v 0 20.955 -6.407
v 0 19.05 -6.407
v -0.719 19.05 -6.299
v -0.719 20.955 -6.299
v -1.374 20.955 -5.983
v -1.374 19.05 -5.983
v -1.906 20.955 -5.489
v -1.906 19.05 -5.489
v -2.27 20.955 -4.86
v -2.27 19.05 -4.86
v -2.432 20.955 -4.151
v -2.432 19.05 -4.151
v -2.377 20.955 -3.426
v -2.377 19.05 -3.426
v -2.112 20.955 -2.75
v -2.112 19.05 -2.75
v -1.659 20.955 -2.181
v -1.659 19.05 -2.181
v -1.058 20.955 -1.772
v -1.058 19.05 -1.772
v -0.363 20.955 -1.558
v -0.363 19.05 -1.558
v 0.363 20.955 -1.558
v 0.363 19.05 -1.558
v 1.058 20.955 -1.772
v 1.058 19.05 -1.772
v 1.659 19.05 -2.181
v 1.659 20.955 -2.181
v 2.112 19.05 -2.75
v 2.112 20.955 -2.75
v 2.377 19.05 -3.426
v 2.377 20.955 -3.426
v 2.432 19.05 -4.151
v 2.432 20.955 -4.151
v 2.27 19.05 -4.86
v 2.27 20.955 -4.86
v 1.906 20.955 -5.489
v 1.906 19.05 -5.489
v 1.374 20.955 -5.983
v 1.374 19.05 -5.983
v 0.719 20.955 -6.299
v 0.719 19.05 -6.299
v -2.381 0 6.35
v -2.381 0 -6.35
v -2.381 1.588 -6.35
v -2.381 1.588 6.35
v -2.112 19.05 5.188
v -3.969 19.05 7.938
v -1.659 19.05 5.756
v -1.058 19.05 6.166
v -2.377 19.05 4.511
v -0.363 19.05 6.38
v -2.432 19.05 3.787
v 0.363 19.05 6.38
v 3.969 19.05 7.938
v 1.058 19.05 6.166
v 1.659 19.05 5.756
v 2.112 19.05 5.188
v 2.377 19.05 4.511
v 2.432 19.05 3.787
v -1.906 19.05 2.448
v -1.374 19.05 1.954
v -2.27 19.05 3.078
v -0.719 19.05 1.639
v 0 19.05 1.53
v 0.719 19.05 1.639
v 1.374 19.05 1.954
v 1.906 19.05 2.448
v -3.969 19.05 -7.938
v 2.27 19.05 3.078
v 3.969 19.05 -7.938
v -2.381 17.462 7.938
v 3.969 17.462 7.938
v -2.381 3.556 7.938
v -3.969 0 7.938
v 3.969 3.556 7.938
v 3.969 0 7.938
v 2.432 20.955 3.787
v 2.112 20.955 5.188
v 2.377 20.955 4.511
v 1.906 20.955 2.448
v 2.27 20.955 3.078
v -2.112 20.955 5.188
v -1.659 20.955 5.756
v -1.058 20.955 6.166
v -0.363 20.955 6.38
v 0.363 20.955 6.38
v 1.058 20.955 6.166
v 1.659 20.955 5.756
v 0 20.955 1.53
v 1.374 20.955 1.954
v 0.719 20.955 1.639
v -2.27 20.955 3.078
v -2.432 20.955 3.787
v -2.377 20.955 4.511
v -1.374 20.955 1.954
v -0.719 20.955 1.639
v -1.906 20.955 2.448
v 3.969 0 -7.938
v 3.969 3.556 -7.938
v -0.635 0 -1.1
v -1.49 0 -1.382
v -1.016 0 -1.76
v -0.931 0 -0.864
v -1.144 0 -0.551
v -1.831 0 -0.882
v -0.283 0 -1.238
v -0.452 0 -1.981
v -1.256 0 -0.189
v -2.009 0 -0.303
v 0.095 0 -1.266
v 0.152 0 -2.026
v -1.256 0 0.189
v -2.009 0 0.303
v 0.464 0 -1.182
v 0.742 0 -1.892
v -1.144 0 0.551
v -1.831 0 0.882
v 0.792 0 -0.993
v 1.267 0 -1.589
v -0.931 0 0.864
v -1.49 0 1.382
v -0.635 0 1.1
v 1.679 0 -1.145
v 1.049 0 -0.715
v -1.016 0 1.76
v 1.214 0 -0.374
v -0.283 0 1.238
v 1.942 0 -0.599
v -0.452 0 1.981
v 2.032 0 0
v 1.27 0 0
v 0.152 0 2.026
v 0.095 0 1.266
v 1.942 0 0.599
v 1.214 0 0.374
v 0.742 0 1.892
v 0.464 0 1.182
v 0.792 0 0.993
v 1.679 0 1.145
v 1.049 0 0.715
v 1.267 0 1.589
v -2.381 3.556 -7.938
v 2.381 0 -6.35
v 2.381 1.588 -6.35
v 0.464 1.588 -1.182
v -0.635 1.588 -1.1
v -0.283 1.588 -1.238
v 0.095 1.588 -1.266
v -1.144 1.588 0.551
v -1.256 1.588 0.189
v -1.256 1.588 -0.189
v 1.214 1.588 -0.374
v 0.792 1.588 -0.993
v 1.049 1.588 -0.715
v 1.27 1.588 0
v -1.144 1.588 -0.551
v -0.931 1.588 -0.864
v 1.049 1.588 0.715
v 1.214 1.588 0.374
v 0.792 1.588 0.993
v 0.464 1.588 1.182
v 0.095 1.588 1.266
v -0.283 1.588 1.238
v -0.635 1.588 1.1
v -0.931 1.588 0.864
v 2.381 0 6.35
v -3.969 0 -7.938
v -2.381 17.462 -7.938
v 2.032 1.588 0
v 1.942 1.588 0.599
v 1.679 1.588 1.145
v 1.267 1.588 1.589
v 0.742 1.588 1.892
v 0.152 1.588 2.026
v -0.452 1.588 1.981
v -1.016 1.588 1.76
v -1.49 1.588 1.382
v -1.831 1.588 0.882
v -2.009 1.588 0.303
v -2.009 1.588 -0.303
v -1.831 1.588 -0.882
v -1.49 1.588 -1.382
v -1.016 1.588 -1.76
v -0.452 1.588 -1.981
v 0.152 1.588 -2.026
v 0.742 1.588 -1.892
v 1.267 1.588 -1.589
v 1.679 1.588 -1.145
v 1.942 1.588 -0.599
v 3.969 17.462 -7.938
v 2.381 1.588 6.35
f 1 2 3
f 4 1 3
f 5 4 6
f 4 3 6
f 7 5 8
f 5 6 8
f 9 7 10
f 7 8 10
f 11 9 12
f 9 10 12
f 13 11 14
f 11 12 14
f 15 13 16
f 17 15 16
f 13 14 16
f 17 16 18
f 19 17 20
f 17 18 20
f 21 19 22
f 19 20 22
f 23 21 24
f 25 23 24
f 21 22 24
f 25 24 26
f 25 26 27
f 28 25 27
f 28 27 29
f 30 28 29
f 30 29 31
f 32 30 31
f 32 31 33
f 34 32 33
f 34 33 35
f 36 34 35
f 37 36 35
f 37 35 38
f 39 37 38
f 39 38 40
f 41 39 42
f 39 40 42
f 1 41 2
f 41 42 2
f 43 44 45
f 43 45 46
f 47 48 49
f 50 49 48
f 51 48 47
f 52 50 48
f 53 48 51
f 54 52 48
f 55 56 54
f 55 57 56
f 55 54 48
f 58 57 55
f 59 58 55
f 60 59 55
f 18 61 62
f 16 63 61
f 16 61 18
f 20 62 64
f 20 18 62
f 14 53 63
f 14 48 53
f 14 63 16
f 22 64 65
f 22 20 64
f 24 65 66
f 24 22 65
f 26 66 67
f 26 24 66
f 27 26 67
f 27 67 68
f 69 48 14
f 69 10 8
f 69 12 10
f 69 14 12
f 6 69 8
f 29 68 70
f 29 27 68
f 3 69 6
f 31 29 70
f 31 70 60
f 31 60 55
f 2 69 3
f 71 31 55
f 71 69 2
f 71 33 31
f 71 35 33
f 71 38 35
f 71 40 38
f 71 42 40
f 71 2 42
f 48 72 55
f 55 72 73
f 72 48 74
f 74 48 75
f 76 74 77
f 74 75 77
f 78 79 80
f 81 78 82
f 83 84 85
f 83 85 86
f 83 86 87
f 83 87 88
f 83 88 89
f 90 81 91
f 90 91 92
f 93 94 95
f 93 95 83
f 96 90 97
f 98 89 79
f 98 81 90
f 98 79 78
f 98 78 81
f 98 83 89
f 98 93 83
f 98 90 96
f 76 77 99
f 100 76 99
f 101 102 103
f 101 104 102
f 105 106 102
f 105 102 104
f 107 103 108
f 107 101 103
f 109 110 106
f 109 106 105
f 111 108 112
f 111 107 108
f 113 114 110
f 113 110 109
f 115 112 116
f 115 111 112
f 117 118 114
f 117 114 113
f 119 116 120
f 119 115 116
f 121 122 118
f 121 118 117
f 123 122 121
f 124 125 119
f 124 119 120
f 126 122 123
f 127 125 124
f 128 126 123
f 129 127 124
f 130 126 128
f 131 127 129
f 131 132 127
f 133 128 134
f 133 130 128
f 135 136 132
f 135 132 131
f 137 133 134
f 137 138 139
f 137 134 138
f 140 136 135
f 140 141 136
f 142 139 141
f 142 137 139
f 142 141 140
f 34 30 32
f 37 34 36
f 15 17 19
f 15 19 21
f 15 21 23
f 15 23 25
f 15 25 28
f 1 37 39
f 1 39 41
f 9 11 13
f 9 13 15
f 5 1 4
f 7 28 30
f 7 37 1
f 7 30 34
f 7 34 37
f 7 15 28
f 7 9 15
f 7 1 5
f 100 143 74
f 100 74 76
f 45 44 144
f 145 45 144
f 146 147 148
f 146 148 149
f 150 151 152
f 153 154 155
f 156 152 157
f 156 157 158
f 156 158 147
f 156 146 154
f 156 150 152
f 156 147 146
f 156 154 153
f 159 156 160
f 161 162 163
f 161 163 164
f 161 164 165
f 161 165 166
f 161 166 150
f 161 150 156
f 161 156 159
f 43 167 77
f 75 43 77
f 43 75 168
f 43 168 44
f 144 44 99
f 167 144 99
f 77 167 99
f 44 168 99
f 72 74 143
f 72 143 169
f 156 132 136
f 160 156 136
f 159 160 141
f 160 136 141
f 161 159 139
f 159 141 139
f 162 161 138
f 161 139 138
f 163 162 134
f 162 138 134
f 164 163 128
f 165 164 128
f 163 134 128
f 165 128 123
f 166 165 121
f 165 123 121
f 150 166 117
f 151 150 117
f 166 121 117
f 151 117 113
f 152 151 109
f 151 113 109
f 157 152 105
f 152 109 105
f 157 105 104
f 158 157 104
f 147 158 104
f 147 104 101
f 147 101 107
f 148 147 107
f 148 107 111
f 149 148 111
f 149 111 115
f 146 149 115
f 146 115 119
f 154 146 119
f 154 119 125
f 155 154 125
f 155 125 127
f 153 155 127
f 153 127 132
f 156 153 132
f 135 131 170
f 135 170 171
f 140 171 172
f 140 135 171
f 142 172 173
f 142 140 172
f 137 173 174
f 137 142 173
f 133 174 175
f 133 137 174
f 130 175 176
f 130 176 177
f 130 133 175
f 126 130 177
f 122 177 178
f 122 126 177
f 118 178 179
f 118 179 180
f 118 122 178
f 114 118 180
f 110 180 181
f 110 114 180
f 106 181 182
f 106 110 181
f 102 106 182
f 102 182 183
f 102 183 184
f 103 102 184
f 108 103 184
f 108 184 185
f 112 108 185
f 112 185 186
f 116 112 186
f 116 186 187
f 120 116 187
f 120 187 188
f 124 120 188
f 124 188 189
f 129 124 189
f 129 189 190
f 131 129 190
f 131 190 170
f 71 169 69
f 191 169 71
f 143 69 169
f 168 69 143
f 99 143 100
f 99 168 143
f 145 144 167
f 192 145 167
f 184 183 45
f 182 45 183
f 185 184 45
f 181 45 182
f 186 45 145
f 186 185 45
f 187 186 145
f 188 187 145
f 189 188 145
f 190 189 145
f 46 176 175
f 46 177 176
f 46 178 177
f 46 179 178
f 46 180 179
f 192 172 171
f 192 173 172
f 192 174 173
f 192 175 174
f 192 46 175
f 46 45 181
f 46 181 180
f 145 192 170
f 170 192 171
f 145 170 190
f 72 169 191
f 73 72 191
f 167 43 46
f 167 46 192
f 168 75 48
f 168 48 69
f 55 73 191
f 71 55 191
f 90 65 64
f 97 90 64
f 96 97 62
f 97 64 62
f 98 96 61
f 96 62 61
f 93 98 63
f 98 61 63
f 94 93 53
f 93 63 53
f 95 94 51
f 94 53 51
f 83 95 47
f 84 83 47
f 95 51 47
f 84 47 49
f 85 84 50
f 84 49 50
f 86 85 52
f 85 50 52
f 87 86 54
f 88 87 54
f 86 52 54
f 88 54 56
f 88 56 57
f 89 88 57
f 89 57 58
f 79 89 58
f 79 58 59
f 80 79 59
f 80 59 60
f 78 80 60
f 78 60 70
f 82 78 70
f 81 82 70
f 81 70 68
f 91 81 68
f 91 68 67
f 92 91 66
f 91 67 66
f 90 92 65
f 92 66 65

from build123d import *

# Parameters (mm, degrees)
SKETCH1_W           = 7.9375
SKETCH1_H           = 15.875
BASE_EXTRUDE_DEPTH  = 19.05
SKETCH2_R           = 2.4384
BOSS_EXTRUDE1_DEPTH = 1.905
LPATTERN6_COUNT     = 2
LPATTERN6_PITCH     = 7.9375
SKETCH4_W           = 4.7625
SKETCH4_H           = 12.7
CUT_EXTRUDE1_DEPTH  = 1.5875
INSDOT_REACH        = 24.757
SKETCH3_R           = 2.032
SKETCH3_R_2         = 1.27
SKETCH5_W           = 6.35
SKETCH5_H           = 13.9065
CUT_EXTRUDE2_DEPTH  = 27.587189144


with BuildPart() as part:
    # Sketch1 → Base-Extrude (new body)
    with BuildSketch(Plane(origin=(0, 0, 0), x_dir=(1, 0, 0), z_dir=(0, 1, 0))):
        Rectangle(SKETCH1_W, SKETCH1_H)
    extrude(amount=BASE_EXTRUDE_DEPTH)

    # Sketch2 → Boss-Extrude1 (add)
    with BuildSketch(Plane(origin=(0, 19.05, 0), x_dir=(-1, 0, 0), z_dir=(0, 1, 0))):
        with Locations(Location((0, 3.96875, 0), (0, 0, 270))):
            Circle(SKETCH2_R)
    boss_extrude1 = extrude(amount=BOSS_EXTRUDE1_DEPTH)

    # LPattern6: Boss-Extrude1 ×2
    with Locations(*[(0, 0, -i * LPATTERN6_PITCH) for i in range(1, LPATTERN6_COUNT)]):
        add(boss_extrude1)

    # Sketch4 → Cut-Extrude1 (cut)
    with BuildSketch(Plane.XZ):
        Rectangle(SKETCH4_W, SKETCH4_H)
    extrude(amount=-CUT_EXTRUDE1_DEPTH, mode=Mode.SUBTRACT)

    # Sketch3 → InsDot (add, up to next)
    with BuildSketch(Plane.XZ, mode=Mode.PRIVATE) as insdot_sk1:
        Circle(SKETCH3_R)
        Circle(SKETCH3_R_2, mode=Mode.SUBTRACT)
    insdot_tool1 = extrude(insdot_sk1.sketch, amount=-INSDOT_REACH, mode=Mode.PRIVATE) - part.part
    add(insdot_tool1.solids().sort_by_distance((-1.974526, 0, 0))[0])

    # Sketch5 → Cut-Extrude2 (cut, through all)
    with BuildSketch(Plane.XY.offset(7.9375)):
        with Locations((0.79375, 10.50925)):
            Rectangle(SKETCH5_W, SKETCH5_H)
    extrude(amount=-CUT_EXTRUDE2_DEPTH, mode=Mode.SUBTRACT)


solid = part.part
